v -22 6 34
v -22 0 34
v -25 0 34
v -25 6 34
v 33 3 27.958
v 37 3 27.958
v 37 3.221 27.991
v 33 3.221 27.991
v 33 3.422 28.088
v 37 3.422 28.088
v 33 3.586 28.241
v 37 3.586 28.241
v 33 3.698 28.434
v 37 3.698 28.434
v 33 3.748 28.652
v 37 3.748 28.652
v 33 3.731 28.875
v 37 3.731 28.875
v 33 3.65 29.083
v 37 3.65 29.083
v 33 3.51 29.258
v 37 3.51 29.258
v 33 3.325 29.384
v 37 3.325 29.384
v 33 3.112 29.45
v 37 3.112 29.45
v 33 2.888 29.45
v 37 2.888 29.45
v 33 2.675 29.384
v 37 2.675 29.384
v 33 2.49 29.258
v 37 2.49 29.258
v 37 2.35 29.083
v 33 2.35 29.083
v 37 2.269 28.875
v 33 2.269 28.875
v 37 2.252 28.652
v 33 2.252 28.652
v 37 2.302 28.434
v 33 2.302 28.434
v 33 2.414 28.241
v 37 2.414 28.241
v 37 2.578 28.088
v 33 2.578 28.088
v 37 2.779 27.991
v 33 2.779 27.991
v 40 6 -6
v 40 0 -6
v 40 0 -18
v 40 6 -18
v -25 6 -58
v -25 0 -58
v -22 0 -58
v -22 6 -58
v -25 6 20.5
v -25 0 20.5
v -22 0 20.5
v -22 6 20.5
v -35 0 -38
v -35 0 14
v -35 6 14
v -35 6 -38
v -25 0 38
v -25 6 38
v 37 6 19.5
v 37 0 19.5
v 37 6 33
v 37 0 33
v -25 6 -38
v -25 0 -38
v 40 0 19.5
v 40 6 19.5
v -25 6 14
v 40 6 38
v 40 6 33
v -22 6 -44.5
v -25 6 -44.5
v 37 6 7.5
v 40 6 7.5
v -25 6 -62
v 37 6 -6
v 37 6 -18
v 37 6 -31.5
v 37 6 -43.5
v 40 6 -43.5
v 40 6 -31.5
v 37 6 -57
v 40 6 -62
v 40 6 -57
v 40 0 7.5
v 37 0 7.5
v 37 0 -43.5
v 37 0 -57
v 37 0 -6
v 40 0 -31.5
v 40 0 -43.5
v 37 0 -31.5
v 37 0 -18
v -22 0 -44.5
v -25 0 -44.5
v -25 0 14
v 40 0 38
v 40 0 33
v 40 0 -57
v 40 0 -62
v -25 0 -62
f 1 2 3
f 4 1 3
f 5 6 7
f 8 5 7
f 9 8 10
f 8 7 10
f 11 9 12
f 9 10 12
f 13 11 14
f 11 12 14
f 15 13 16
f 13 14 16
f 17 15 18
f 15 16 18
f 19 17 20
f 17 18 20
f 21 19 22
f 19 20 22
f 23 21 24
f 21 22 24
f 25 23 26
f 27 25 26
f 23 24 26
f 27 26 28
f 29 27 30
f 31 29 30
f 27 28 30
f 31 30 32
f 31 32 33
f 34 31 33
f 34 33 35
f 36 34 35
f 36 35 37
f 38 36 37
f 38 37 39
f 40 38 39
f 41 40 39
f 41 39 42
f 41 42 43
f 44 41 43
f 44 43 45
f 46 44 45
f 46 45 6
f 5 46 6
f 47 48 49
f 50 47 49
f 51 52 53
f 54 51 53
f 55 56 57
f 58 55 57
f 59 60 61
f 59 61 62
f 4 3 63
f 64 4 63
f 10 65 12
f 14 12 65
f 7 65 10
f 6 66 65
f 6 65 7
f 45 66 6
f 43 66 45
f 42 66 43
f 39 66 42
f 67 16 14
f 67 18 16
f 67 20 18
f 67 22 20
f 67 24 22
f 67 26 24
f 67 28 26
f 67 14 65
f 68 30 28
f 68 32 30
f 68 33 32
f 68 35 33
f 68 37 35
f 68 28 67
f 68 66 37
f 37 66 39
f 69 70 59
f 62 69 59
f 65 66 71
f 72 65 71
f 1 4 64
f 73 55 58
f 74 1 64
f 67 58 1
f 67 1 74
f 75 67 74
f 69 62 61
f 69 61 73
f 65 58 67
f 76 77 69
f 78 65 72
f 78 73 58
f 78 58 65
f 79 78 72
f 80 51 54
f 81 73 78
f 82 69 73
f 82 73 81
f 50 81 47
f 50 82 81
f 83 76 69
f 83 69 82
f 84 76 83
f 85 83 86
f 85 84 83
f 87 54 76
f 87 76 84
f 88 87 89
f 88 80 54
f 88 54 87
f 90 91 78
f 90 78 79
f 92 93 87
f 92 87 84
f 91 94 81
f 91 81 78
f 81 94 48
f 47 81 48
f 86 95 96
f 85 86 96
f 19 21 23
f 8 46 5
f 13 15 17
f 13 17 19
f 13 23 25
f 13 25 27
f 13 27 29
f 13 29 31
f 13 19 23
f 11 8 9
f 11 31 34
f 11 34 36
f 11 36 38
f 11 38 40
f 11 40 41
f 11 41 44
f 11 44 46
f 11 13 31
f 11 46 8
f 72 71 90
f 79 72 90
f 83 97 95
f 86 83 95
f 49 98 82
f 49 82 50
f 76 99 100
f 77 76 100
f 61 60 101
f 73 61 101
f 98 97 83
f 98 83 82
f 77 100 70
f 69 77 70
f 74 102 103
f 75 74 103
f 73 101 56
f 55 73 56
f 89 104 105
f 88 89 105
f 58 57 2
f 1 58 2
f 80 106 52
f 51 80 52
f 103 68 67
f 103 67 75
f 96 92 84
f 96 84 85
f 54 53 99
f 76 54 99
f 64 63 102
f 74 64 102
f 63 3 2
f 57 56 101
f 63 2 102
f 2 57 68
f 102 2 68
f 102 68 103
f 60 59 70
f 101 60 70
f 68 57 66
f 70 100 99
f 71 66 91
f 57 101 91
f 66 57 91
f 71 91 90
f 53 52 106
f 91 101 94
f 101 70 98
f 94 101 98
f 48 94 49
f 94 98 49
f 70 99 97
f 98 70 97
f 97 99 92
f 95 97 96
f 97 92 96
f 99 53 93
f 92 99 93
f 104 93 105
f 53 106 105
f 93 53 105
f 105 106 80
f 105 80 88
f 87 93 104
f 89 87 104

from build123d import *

# Parameters (mm, degrees)
SKETCH_1_W          = 75
SKETCH_1_H          = 100
EXTRUDE_1_DEPTH     = 6
SKETCH_3_R          = 0.75
CUT_EXTRUDE_1_DEPTH = 7
SKETCH_4_W          = 12.62553929
SKETCH_4_H          = 13.5
SKETCH_4_W_2        = 12.874809427
SKETCH_4_W_3        = 12.837463025
CUT_EXTRUDE_2_DEPTH = 75.027022093


with BuildPart() as part:
    # Эскиз1 → Вытянуть1 (new body)
    with BuildSketch(Plane(origin=(0, 0, 0), x_dir=(1, 0, 0), z_dir=(0, 1, 0))):
        with Locations((2.5, 12)):
            Rectangle(SKETCH_1_W, SKETCH_1_H)
    extrude(amount=EXTRUDE_1_DEPTH)

    # Эскиз3 → Вырез-Вытянуть1 (cut)
    with BuildSketch(Plane(origin=(40, 0, 0), x_dir=(0, 0, -1), z_dir=(1, 0, 0))):
        with Locations((-28.708129091, 3)):
            Circle(SKETCH_3_R)
    extrude(amount=-CUT_EXTRUDE_1_DEPTH, mode=Mode.SUBTRACT)

    # Эскиз4 → Вырез-Вытянуть2 (cut, through all)
    with BuildSketch(Plane.XZ):
        with Locations((43.312769645, 26.25)):
            Rectangle(SKETCH_4_W, SKETCH_4_H)
        with Locations((43.437404714, -50.25)):
            Rectangle(SKETCH_4_W_2, SKETCH_4_H)
        Polygon((-35, -38), (-35, -62), (-25, -62), (-25, -58), (-22, -58), (-22, -44.5), (-25, -44.5), (-25, -38), align=None)
        with Locations((43.418731513, 0.75)):
            Rectangle(SKETCH_4_W_3, SKETCH_4_H)
        with Locations((43.418731513, -24.75)):
            Rectangle(SKETCH_4_W_3, SKETCH_4_H)
        Polygon((-35, 14), (-25, 14), (-25, 20.5), (-22, 20.5), (-22, 34), (-25, 34), (-25, 38), (-35, 38), align=None)
    extrude(amount=-CUT_EXTRUDE_2_DEPTH, mode=Mode.SUBTRACT)


solid = part.part
